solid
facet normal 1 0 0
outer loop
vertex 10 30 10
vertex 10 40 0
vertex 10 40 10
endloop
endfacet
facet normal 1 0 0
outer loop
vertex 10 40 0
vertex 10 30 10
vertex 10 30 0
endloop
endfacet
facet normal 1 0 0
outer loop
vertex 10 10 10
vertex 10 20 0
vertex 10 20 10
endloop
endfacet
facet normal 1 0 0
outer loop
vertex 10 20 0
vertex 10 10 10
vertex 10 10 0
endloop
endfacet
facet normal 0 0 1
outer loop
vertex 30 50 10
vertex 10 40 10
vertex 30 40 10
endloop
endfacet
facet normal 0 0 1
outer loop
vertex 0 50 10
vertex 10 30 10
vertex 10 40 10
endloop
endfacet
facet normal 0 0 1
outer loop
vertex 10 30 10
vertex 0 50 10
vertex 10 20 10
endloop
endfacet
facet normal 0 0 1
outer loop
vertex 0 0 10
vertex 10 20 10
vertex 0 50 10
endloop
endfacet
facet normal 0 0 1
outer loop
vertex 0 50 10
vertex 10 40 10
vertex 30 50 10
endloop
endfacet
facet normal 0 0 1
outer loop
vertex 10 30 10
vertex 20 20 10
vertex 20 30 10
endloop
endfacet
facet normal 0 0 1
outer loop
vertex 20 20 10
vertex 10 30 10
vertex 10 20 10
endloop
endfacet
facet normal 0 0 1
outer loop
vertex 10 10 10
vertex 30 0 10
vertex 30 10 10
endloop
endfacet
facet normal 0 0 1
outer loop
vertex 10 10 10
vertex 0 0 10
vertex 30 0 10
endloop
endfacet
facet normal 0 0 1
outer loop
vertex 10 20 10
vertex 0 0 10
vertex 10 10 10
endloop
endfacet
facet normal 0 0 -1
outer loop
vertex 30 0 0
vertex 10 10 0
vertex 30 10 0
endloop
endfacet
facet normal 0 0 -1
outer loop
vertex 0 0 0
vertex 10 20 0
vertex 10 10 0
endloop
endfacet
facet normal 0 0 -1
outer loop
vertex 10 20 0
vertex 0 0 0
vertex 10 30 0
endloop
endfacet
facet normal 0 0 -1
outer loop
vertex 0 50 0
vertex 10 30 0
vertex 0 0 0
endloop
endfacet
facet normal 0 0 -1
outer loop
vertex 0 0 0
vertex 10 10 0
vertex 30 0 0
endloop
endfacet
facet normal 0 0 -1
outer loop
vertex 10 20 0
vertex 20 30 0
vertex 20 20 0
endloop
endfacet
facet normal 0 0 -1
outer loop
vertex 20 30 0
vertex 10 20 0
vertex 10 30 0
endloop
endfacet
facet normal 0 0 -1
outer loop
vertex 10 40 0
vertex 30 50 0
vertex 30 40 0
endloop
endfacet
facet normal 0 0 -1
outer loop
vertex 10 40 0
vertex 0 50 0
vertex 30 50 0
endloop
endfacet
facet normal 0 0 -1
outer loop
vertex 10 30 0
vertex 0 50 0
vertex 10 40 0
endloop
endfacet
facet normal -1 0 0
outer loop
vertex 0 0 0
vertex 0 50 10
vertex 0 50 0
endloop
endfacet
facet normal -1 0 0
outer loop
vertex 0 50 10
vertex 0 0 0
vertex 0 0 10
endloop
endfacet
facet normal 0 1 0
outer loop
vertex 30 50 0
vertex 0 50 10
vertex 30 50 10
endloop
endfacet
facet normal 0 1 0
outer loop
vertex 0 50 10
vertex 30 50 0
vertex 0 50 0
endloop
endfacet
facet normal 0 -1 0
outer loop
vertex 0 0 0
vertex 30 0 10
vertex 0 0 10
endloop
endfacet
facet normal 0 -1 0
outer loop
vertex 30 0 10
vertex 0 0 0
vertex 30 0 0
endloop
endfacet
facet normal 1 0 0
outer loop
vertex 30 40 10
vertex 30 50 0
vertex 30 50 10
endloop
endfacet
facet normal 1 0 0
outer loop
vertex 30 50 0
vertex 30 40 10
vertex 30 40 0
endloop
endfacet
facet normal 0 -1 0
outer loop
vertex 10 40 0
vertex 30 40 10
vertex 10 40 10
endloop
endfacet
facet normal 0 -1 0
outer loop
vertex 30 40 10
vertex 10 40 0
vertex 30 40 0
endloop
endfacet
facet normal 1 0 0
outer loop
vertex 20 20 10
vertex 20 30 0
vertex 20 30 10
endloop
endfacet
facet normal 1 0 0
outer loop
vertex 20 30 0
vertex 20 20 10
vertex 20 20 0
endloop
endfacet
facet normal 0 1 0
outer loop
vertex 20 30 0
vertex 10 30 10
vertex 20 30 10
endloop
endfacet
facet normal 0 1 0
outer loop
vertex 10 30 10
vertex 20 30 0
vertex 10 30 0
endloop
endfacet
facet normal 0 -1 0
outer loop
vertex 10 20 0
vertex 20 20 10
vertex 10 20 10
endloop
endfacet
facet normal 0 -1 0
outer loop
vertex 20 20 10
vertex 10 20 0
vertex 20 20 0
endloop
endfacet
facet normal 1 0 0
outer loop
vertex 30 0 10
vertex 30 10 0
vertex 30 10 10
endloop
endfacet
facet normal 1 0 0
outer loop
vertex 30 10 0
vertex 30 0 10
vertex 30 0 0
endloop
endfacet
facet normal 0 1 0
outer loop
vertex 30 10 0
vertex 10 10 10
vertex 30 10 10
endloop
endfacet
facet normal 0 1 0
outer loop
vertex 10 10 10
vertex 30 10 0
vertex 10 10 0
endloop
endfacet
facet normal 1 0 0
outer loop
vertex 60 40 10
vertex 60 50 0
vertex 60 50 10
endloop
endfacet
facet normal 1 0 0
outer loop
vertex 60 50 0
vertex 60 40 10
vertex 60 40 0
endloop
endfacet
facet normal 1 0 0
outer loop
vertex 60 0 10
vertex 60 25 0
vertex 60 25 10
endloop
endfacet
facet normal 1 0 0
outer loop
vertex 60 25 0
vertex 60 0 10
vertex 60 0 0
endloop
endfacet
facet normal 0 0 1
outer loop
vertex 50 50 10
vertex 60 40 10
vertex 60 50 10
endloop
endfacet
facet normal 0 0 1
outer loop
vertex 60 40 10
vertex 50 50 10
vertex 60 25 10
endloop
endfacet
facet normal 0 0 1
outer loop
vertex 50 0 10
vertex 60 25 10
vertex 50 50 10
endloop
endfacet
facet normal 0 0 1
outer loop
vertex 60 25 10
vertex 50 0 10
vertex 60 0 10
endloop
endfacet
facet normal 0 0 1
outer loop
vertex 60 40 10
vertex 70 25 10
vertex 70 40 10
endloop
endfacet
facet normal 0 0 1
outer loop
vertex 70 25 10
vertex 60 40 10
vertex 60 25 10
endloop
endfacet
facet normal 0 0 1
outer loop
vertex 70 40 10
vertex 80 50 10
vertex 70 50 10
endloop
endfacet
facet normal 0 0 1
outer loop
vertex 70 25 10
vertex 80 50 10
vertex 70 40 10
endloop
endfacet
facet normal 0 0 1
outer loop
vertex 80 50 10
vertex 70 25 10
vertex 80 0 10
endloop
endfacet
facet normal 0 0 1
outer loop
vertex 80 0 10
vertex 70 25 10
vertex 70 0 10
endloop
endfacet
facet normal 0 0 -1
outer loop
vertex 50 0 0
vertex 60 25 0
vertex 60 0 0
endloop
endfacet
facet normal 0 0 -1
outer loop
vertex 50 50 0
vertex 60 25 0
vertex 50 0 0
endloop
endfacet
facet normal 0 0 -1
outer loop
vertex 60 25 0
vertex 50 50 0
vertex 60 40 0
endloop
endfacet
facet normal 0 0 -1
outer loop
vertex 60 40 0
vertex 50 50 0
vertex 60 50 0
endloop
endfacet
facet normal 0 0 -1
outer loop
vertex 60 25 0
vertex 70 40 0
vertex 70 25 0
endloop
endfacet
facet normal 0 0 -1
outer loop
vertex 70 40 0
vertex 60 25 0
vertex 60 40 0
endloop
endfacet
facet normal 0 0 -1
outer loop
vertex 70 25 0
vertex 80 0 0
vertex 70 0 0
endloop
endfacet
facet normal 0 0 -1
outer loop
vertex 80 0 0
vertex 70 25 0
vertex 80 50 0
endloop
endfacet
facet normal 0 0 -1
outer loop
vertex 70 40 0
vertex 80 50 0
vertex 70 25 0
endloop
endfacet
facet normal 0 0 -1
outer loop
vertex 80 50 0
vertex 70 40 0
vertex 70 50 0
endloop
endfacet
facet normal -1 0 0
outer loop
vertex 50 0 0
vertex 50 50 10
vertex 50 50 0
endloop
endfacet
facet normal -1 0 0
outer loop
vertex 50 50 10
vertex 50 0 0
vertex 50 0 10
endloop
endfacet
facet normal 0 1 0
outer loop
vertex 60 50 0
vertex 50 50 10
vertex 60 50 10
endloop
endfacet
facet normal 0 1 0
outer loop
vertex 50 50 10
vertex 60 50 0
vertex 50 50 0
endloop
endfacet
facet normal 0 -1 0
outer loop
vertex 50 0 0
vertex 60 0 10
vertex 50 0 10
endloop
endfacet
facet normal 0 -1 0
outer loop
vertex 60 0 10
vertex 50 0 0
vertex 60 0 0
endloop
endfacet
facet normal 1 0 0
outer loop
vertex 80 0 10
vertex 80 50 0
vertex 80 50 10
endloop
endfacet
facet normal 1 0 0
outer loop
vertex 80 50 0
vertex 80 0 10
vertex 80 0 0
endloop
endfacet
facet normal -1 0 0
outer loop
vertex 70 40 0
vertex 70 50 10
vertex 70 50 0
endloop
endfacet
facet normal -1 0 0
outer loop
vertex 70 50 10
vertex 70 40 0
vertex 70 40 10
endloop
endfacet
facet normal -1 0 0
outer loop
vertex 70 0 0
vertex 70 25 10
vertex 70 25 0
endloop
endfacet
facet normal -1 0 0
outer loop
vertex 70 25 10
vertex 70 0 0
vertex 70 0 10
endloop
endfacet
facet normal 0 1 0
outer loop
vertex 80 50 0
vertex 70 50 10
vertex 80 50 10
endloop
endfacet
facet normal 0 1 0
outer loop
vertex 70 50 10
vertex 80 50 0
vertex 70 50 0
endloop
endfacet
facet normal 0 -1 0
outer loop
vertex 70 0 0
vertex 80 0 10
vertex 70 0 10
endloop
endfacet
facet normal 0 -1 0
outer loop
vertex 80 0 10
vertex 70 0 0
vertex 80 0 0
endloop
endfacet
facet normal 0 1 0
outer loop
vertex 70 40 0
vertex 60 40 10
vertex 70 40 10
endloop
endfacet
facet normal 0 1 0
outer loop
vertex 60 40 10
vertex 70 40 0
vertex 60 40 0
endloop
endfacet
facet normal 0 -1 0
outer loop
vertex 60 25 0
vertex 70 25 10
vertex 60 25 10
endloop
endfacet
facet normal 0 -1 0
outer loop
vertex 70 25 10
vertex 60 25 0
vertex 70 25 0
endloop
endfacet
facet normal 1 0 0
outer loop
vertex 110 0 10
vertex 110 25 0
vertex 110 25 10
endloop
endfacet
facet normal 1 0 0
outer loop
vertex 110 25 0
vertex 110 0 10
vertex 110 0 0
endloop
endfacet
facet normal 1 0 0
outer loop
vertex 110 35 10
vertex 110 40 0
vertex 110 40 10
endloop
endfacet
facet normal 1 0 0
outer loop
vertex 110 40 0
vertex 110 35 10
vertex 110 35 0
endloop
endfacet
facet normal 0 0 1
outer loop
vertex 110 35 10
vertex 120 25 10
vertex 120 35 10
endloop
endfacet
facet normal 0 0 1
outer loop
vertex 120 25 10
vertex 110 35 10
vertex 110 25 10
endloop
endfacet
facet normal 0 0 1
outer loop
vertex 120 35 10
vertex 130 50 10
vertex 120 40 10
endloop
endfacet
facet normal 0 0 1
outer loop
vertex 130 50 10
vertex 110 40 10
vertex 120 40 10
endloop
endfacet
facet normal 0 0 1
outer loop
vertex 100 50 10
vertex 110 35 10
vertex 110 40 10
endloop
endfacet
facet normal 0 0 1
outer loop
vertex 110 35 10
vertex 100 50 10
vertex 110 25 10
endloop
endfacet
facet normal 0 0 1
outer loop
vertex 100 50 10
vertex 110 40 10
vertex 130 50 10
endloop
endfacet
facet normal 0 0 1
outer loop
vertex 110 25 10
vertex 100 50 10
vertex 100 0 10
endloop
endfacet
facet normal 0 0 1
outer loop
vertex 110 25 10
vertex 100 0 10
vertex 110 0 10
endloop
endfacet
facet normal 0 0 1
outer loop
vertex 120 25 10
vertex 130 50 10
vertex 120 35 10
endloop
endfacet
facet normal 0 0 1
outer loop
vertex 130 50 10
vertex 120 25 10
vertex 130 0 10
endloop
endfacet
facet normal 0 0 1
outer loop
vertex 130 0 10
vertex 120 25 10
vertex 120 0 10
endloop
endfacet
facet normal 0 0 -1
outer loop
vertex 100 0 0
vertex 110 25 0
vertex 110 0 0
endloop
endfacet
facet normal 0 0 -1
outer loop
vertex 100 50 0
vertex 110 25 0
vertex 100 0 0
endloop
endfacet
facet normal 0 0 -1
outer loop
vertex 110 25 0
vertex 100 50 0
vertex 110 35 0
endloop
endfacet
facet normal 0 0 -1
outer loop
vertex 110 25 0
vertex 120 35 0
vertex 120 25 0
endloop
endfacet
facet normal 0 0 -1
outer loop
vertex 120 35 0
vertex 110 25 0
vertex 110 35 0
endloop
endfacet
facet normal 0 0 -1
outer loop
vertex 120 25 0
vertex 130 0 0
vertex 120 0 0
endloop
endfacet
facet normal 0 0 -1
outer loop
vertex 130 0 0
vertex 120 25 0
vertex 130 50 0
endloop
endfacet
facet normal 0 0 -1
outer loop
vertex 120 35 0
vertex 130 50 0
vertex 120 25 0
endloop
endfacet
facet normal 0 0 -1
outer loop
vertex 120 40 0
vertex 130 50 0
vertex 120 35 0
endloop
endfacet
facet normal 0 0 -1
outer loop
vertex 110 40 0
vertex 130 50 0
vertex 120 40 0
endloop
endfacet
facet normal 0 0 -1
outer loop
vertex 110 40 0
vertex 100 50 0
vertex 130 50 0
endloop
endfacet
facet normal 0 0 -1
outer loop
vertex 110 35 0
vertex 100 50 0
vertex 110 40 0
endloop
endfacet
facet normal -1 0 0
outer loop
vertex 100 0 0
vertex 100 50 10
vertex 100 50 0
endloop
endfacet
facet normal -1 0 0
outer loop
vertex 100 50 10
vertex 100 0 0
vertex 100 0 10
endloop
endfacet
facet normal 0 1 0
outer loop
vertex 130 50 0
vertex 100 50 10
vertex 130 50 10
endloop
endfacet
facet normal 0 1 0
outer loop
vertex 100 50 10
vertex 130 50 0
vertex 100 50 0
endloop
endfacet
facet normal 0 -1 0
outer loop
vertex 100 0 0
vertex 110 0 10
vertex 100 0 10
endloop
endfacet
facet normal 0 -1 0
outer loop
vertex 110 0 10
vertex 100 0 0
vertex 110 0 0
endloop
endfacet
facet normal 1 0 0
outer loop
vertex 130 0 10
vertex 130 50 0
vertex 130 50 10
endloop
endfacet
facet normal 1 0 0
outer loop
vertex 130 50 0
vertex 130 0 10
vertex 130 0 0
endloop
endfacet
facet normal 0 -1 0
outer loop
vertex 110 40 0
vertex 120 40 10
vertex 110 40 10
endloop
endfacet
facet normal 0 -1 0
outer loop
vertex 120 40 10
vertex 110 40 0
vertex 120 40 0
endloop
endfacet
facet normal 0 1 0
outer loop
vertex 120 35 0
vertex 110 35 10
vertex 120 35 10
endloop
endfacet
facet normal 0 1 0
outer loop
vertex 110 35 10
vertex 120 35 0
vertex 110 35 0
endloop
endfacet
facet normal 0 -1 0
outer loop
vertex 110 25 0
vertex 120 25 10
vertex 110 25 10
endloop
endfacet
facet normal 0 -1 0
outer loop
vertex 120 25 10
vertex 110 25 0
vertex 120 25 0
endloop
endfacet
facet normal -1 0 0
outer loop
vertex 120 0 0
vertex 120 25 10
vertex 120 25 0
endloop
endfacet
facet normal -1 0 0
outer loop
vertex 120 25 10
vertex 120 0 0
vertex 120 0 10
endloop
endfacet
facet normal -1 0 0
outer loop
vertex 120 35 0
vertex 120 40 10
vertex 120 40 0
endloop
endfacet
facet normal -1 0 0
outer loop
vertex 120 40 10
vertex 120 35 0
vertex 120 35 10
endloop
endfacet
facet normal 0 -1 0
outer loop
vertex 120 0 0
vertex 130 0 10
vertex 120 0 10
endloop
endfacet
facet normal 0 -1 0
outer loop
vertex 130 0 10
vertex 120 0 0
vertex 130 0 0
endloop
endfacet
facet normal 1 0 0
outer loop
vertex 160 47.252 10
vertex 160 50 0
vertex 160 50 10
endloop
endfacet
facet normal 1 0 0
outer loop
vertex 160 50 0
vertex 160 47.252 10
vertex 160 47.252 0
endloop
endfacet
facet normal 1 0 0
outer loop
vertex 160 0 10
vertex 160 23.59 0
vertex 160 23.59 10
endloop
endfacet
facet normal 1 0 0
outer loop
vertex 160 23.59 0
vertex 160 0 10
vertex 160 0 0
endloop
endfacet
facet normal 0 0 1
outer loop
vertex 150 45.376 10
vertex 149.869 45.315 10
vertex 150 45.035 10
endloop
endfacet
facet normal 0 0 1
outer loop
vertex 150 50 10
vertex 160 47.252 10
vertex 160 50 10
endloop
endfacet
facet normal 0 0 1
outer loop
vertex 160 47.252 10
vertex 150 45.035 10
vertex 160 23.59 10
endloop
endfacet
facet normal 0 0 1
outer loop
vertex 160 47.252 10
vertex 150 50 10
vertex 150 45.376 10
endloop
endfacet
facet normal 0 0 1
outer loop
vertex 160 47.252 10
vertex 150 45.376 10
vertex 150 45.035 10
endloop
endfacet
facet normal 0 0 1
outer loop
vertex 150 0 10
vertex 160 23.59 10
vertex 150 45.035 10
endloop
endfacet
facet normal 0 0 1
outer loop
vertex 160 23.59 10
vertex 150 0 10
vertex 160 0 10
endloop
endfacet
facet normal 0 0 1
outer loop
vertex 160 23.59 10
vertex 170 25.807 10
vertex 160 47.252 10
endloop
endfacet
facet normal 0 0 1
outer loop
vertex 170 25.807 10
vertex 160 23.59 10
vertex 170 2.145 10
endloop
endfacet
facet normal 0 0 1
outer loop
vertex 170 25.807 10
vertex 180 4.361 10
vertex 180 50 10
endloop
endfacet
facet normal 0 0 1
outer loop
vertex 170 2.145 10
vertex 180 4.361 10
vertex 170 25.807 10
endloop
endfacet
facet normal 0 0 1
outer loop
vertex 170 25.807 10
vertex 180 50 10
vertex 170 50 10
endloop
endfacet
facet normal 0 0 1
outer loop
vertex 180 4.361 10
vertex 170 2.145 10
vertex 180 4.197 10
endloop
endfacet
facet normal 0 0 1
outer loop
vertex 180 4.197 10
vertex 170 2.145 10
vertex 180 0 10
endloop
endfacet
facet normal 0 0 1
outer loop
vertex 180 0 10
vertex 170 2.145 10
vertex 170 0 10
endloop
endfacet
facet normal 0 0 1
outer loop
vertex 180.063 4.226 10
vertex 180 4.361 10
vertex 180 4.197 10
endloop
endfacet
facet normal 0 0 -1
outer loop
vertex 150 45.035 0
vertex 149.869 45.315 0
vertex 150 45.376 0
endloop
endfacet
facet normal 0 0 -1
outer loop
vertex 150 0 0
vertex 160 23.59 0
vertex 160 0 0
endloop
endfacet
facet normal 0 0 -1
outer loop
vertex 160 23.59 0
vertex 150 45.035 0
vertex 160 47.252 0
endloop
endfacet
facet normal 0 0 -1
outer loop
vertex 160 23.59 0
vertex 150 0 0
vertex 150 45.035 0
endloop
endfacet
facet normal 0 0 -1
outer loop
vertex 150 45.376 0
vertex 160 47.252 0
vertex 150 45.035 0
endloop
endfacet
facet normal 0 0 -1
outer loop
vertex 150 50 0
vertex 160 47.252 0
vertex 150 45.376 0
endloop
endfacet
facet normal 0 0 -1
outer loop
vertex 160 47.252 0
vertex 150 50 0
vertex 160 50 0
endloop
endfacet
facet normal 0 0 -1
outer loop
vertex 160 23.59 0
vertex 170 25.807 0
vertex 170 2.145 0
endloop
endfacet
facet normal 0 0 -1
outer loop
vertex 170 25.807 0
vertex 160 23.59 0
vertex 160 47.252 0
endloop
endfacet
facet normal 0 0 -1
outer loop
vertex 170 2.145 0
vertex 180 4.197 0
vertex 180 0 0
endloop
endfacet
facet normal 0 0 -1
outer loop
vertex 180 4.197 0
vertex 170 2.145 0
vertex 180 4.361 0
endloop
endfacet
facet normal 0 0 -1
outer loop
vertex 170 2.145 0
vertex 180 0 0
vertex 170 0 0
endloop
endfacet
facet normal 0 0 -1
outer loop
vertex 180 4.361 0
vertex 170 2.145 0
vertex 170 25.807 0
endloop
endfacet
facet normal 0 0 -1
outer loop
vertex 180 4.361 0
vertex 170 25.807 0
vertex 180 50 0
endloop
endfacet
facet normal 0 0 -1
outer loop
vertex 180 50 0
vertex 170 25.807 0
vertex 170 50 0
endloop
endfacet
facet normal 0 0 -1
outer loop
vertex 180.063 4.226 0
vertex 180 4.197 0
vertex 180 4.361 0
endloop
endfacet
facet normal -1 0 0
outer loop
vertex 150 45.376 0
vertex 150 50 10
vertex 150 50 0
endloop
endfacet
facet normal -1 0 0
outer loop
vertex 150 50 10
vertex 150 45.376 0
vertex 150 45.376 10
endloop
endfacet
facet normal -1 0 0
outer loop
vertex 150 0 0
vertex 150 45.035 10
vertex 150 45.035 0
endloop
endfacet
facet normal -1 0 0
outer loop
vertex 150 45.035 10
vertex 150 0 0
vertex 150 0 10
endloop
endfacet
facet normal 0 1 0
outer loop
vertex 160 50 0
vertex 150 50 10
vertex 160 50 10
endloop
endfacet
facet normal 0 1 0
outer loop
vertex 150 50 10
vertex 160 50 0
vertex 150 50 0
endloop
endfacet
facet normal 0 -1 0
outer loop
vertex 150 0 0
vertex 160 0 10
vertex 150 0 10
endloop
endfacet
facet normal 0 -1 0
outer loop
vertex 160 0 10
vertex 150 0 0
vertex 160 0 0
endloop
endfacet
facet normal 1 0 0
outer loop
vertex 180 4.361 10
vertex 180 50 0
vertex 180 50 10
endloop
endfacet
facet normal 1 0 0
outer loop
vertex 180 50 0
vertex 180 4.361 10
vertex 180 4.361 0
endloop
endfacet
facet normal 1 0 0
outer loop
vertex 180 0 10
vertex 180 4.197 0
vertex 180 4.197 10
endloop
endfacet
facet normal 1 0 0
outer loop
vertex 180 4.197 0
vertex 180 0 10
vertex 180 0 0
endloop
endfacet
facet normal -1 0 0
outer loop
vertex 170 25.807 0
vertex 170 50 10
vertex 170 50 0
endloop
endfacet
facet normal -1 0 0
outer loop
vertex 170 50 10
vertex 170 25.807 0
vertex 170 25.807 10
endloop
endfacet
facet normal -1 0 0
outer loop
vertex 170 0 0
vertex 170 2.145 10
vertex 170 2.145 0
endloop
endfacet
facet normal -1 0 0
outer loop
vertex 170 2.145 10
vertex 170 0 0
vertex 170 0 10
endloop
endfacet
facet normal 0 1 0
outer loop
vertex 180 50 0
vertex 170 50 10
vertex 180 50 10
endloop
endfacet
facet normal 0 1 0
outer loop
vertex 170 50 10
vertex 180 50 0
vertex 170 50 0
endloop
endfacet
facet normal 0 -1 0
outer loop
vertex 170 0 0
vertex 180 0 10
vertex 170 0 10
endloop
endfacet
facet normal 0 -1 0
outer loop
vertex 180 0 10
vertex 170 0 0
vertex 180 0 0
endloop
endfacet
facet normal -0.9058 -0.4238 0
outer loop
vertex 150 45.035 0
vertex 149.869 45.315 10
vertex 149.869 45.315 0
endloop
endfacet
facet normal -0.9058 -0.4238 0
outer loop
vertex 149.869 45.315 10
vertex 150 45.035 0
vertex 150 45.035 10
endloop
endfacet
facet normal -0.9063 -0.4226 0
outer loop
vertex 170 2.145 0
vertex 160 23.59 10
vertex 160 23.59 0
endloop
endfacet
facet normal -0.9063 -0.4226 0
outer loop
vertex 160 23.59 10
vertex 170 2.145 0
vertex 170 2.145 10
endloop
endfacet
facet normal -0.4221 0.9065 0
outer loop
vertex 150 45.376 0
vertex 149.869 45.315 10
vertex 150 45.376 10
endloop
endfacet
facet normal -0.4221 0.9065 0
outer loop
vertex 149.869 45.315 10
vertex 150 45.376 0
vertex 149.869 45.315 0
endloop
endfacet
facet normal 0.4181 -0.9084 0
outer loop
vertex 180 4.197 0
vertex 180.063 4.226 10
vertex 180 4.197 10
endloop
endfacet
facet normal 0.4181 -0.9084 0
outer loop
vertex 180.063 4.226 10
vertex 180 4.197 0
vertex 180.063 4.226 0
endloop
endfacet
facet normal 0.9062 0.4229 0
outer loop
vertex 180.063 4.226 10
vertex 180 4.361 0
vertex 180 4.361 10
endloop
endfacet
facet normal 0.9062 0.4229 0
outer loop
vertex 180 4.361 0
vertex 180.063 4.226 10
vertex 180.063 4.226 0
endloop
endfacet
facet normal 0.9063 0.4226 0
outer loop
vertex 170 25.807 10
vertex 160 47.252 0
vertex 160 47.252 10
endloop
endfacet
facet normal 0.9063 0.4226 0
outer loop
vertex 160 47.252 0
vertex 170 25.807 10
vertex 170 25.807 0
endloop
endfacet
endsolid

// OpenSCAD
union(){
    translate(v=[0, 0, 0]){
        color("red"){
            union(){
                cube(size=[10, 50, 10]);
                translate(v=[0, 40, 0]){
                    cube(size=[30, 10, 10]);
                };
                translate(v=[0, 20, 0]){
                    cube(size=[20, 10, 10]);
                };
                translate(v=[0, 0, 0]){
                    cube(size=[30, 10, 10]);
                };
            };
        };
    };
    translate(v=[50, 0, 0]){
        color("blue"){
            union(){
                cube(size=[10, 50, 10]);
                translate(v=[20, 0, 0]){
                    cube(size=[10, 50, 10]);
                };
                translate(v=[10, 25, 0]){
                    cube(size=[10, 15.0, 10]);
                };
            };
        };
    };
    translate(v=[100, 0, 0]){
        color("red"){
            union(){
                cube(size=[10, 50, 10]);
                translate(v=[0, 40, 0]){
                    cube(size=[30, 10, 10]);
                };
                translate(v=[0, 25, 0]){
                    cube(size=[30, 10, 10]);
                };
                translate(v=[20, 0, 0]){
                    cube(size=[10, 50, 10]);
                };
            };
        };
    };
    translate(v=[150, 0, 0]){
        color("blue"){
            union(){
                cube(size=[10, 50, 10]);
                translate(v=[20, 0, 0]){
                    cube(size=[10, 50, 10]);
                };
                translate(v=[21, 0, 0]){
                    rotate(a=[0, 0, 25]){
                        cube(size=[10, 50, 10]);
                    };
                };
            };
        };
    };
};
